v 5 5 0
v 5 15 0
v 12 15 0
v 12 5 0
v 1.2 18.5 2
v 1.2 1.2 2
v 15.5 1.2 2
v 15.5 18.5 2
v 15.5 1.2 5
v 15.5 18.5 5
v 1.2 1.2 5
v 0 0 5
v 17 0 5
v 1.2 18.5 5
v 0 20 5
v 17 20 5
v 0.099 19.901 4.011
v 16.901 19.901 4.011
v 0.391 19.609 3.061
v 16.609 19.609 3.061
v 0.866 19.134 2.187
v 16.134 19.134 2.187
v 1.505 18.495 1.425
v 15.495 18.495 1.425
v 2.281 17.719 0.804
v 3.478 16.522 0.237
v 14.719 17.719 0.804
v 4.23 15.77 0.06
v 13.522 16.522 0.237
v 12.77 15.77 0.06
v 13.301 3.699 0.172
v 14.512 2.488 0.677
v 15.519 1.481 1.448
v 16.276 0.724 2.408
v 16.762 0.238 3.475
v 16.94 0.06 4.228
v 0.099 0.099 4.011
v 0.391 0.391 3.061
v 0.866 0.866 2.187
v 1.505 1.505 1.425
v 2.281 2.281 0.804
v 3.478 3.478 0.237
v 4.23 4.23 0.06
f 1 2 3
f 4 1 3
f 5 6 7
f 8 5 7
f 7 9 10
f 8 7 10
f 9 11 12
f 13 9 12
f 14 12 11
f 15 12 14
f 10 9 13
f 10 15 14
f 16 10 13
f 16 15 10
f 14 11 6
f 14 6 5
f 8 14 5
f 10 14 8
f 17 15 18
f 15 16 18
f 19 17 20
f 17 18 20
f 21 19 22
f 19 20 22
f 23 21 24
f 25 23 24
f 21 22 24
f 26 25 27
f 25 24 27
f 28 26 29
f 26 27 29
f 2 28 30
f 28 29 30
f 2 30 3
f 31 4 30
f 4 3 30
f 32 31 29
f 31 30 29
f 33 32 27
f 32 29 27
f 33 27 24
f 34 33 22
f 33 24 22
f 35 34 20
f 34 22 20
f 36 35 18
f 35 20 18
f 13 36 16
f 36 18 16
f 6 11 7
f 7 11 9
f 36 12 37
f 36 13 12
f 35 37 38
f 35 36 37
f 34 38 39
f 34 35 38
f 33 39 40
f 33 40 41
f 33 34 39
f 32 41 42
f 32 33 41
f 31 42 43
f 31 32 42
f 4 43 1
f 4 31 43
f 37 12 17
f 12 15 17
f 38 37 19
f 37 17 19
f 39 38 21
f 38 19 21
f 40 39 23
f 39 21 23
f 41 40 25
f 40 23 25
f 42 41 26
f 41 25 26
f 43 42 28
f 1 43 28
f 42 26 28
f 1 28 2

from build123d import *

# Parameters (mm, degrees)
F0_W     = 17
F0_H     = 20
F1_DEPTH = 5
F2_W     = 14.3
F2_H     = 17.3
F3_DEPTH = 3
F4_R     = 4.99999


# Not quite as in the source:
# - a fillet or chamfer is up to 0.001 mm smaller than in the source, because OpenCascade refuses the exact size


with BuildPart() as f1:
    # F0 (on Top) → F1 (new body)
    with BuildSketch(Plane.XY):
        with Locations((8.5, 10)):
            Rectangle(F0_W, F0_H)
    extrude(amount=F1_DEPTH)

    # F2 (on face) → F3 (cut)
    with BuildSketch(Plane.XY.offset(5)):
        with Locations((8.35, 9.85)):
            Rectangle(F2_W, F2_H)
    extrude(amount=-F3_DEPTH, mode=Mode.SUBTRACT)

    # F4 (radius 5 in the source; OpenCascade refuses exactly that, so slightly less here)
    f4_edges = [f1.edges().sort_by_distance(p)[0] for p in [
        (0, 10, 0),
        (8.5, 20, 0),
        (17, 10, 0),
        (8.5, 0, 0),
    ]]
    fillet(f4_edges, radius=F4_R)


solid = f1.part
